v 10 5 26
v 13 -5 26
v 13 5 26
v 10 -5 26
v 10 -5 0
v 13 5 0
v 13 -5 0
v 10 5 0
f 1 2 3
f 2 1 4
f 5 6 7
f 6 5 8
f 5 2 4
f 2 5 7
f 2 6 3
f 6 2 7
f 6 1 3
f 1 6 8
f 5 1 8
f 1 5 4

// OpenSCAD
width=20;
gap=26;
rope_hole=3;
mount_hole=4;
wheel_spacing=9;


r= mount_hole/2+3;
module top_bracket_side() {
 linear_extrude(height=3){
  difference(){
    union(){
      circle(r);
      translate([0,-r]) square(r*2);
    }
    circle(mount_hole/2);
  }
 }
}

//top_bracket_side();
//translate([0,0,width+3]) top_bracket_side();
translate([2*r,-r])
 cube([3,r*2,width+6]);

module pulley_wheel_side() {
  //cube([
}

pulley_wheel_side();
